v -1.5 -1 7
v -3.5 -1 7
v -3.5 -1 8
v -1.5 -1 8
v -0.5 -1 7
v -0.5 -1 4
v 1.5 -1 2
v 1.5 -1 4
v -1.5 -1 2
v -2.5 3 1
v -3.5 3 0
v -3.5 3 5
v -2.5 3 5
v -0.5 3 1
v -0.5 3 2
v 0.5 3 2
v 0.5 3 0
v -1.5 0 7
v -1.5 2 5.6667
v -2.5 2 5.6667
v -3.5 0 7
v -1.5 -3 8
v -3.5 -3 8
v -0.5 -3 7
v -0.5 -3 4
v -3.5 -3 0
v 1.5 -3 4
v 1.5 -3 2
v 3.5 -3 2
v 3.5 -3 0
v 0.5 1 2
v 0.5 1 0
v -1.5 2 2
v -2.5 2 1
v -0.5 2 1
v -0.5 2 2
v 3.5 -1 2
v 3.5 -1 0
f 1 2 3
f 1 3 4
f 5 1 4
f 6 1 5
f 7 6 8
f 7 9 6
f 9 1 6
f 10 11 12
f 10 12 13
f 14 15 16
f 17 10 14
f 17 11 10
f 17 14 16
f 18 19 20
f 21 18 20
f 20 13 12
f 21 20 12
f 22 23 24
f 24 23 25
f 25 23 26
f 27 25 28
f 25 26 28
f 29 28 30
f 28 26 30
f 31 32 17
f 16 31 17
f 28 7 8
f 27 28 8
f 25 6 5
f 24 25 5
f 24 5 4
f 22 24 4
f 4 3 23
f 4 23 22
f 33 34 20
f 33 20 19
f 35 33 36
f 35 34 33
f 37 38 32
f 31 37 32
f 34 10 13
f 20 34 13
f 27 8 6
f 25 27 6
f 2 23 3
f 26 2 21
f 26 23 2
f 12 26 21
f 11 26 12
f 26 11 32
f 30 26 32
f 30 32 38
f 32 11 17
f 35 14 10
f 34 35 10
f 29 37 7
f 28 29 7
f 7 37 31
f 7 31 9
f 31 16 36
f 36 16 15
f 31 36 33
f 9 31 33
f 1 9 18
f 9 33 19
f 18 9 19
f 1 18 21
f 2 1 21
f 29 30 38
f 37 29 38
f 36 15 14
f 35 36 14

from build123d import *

# Parameters (mm, degrees)
SKETCH1_W           = 7
SKETCH1_H           = 6
BOSS_EXTRUDE2_DEPTH = 8
CUT_EXTRUDE2_DEPTH  = 7
CUT_EXTRUDE3_DEPTH  = 4
CUT_EXTRUDE4_DEPTH  = 2
CUT_EXTRUDE5_DEPTH  = 1
SKETCH10_W          = 2
SKETCH10_H          = 3.605551276
CUT_EXTRUDE6_DEPTH  = 3.496150883


with BuildPart() as part:
    # Sketch1 → Boss-Extrude2 (new body)
    with BuildSketch(Plane.XY):
        Rectangle(SKETCH1_W, SKETCH1_H)
    extrude(amount=BOSS_EXTRUDE2_DEPTH)

    # Sketch4 → Cut-Extrude2 (cut, through all)
    with BuildSketch(Plane(origin=(0, 3, 0), x_dir=(1, 0, 0), z_dir=(0, 1, 0))):
        Polygon((3.5, -2), (1.5, -2), (1.5, -4), (-0.5, -4), (-0.5, -7), (-1.5, -8), (3.5, -8), align=None)
    extrude(amount=-CUT_EXTRUDE2_DEPTH, mode=Mode.SUBTRACT)

    # Sketch5 → Cut-Extrude3 (cut)
    with BuildSketch(Plane(origin=(0, 3, 0), x_dir=(1, 0, 0), z_dir=(0, 1, 0))):
        Polygon((1.5, -4), (1.5, -2), (-1.5, -2), (-1.5, -7), (-3.5, -7), (-3.5, -8), (-1.5, -8), (-0.5, -7), (-0.5, -4), align=None)
    extrude(amount=-CUT_EXTRUDE3_DEPTH, mode=Mode.SUBTRACT)

    # Sketch6 → Cut-Extrude4 (cut)
    with BuildSketch(Plane(origin=(0, 0, 0), x_dir=(-1, 0, 0), z_dir=(0, 0, -1))):
        Polygon((-3.5, -1), (-0.5, 1), (-0.5, 3), (-3.5, 3), align=None)
    extrude(amount=-CUT_EXTRUDE4_DEPTH, mode=Mode.SUBTRACT)

    # Sketch7 → Cut-Extrude5 (cut)
    with BuildSketch(Plane(origin=(0, 3, 0), x_dir=(1, 0, 0), z_dir=(0, 1, 0))):
        Polygon((-0.5, -2), (-0.5, -1), (-2.5, -1), (-2.5, -6), (-1.5, -6), (-1.5, -2), align=None)
    extrude(amount=-CUT_EXTRUDE5_DEPTH, mode=Mode.SUBTRACT)

    # Sketch10 → Cut-Extrude6 (cut, through all)
    with BuildSketch(Plane(origin=(0, 3.230769231, 4.846153846), x_dir=(-1, 0, 0), z_dir=(0, -0.554700196, -0.832050294))):
        with Locations((2.5, -2.080125736)):
            Rectangle(SKETCH10_W, SKETCH10_H)
    extrude(amount=-CUT_EXTRUDE6_DEPTH, mode=Mode.SUBTRACT)


solid = part.part
